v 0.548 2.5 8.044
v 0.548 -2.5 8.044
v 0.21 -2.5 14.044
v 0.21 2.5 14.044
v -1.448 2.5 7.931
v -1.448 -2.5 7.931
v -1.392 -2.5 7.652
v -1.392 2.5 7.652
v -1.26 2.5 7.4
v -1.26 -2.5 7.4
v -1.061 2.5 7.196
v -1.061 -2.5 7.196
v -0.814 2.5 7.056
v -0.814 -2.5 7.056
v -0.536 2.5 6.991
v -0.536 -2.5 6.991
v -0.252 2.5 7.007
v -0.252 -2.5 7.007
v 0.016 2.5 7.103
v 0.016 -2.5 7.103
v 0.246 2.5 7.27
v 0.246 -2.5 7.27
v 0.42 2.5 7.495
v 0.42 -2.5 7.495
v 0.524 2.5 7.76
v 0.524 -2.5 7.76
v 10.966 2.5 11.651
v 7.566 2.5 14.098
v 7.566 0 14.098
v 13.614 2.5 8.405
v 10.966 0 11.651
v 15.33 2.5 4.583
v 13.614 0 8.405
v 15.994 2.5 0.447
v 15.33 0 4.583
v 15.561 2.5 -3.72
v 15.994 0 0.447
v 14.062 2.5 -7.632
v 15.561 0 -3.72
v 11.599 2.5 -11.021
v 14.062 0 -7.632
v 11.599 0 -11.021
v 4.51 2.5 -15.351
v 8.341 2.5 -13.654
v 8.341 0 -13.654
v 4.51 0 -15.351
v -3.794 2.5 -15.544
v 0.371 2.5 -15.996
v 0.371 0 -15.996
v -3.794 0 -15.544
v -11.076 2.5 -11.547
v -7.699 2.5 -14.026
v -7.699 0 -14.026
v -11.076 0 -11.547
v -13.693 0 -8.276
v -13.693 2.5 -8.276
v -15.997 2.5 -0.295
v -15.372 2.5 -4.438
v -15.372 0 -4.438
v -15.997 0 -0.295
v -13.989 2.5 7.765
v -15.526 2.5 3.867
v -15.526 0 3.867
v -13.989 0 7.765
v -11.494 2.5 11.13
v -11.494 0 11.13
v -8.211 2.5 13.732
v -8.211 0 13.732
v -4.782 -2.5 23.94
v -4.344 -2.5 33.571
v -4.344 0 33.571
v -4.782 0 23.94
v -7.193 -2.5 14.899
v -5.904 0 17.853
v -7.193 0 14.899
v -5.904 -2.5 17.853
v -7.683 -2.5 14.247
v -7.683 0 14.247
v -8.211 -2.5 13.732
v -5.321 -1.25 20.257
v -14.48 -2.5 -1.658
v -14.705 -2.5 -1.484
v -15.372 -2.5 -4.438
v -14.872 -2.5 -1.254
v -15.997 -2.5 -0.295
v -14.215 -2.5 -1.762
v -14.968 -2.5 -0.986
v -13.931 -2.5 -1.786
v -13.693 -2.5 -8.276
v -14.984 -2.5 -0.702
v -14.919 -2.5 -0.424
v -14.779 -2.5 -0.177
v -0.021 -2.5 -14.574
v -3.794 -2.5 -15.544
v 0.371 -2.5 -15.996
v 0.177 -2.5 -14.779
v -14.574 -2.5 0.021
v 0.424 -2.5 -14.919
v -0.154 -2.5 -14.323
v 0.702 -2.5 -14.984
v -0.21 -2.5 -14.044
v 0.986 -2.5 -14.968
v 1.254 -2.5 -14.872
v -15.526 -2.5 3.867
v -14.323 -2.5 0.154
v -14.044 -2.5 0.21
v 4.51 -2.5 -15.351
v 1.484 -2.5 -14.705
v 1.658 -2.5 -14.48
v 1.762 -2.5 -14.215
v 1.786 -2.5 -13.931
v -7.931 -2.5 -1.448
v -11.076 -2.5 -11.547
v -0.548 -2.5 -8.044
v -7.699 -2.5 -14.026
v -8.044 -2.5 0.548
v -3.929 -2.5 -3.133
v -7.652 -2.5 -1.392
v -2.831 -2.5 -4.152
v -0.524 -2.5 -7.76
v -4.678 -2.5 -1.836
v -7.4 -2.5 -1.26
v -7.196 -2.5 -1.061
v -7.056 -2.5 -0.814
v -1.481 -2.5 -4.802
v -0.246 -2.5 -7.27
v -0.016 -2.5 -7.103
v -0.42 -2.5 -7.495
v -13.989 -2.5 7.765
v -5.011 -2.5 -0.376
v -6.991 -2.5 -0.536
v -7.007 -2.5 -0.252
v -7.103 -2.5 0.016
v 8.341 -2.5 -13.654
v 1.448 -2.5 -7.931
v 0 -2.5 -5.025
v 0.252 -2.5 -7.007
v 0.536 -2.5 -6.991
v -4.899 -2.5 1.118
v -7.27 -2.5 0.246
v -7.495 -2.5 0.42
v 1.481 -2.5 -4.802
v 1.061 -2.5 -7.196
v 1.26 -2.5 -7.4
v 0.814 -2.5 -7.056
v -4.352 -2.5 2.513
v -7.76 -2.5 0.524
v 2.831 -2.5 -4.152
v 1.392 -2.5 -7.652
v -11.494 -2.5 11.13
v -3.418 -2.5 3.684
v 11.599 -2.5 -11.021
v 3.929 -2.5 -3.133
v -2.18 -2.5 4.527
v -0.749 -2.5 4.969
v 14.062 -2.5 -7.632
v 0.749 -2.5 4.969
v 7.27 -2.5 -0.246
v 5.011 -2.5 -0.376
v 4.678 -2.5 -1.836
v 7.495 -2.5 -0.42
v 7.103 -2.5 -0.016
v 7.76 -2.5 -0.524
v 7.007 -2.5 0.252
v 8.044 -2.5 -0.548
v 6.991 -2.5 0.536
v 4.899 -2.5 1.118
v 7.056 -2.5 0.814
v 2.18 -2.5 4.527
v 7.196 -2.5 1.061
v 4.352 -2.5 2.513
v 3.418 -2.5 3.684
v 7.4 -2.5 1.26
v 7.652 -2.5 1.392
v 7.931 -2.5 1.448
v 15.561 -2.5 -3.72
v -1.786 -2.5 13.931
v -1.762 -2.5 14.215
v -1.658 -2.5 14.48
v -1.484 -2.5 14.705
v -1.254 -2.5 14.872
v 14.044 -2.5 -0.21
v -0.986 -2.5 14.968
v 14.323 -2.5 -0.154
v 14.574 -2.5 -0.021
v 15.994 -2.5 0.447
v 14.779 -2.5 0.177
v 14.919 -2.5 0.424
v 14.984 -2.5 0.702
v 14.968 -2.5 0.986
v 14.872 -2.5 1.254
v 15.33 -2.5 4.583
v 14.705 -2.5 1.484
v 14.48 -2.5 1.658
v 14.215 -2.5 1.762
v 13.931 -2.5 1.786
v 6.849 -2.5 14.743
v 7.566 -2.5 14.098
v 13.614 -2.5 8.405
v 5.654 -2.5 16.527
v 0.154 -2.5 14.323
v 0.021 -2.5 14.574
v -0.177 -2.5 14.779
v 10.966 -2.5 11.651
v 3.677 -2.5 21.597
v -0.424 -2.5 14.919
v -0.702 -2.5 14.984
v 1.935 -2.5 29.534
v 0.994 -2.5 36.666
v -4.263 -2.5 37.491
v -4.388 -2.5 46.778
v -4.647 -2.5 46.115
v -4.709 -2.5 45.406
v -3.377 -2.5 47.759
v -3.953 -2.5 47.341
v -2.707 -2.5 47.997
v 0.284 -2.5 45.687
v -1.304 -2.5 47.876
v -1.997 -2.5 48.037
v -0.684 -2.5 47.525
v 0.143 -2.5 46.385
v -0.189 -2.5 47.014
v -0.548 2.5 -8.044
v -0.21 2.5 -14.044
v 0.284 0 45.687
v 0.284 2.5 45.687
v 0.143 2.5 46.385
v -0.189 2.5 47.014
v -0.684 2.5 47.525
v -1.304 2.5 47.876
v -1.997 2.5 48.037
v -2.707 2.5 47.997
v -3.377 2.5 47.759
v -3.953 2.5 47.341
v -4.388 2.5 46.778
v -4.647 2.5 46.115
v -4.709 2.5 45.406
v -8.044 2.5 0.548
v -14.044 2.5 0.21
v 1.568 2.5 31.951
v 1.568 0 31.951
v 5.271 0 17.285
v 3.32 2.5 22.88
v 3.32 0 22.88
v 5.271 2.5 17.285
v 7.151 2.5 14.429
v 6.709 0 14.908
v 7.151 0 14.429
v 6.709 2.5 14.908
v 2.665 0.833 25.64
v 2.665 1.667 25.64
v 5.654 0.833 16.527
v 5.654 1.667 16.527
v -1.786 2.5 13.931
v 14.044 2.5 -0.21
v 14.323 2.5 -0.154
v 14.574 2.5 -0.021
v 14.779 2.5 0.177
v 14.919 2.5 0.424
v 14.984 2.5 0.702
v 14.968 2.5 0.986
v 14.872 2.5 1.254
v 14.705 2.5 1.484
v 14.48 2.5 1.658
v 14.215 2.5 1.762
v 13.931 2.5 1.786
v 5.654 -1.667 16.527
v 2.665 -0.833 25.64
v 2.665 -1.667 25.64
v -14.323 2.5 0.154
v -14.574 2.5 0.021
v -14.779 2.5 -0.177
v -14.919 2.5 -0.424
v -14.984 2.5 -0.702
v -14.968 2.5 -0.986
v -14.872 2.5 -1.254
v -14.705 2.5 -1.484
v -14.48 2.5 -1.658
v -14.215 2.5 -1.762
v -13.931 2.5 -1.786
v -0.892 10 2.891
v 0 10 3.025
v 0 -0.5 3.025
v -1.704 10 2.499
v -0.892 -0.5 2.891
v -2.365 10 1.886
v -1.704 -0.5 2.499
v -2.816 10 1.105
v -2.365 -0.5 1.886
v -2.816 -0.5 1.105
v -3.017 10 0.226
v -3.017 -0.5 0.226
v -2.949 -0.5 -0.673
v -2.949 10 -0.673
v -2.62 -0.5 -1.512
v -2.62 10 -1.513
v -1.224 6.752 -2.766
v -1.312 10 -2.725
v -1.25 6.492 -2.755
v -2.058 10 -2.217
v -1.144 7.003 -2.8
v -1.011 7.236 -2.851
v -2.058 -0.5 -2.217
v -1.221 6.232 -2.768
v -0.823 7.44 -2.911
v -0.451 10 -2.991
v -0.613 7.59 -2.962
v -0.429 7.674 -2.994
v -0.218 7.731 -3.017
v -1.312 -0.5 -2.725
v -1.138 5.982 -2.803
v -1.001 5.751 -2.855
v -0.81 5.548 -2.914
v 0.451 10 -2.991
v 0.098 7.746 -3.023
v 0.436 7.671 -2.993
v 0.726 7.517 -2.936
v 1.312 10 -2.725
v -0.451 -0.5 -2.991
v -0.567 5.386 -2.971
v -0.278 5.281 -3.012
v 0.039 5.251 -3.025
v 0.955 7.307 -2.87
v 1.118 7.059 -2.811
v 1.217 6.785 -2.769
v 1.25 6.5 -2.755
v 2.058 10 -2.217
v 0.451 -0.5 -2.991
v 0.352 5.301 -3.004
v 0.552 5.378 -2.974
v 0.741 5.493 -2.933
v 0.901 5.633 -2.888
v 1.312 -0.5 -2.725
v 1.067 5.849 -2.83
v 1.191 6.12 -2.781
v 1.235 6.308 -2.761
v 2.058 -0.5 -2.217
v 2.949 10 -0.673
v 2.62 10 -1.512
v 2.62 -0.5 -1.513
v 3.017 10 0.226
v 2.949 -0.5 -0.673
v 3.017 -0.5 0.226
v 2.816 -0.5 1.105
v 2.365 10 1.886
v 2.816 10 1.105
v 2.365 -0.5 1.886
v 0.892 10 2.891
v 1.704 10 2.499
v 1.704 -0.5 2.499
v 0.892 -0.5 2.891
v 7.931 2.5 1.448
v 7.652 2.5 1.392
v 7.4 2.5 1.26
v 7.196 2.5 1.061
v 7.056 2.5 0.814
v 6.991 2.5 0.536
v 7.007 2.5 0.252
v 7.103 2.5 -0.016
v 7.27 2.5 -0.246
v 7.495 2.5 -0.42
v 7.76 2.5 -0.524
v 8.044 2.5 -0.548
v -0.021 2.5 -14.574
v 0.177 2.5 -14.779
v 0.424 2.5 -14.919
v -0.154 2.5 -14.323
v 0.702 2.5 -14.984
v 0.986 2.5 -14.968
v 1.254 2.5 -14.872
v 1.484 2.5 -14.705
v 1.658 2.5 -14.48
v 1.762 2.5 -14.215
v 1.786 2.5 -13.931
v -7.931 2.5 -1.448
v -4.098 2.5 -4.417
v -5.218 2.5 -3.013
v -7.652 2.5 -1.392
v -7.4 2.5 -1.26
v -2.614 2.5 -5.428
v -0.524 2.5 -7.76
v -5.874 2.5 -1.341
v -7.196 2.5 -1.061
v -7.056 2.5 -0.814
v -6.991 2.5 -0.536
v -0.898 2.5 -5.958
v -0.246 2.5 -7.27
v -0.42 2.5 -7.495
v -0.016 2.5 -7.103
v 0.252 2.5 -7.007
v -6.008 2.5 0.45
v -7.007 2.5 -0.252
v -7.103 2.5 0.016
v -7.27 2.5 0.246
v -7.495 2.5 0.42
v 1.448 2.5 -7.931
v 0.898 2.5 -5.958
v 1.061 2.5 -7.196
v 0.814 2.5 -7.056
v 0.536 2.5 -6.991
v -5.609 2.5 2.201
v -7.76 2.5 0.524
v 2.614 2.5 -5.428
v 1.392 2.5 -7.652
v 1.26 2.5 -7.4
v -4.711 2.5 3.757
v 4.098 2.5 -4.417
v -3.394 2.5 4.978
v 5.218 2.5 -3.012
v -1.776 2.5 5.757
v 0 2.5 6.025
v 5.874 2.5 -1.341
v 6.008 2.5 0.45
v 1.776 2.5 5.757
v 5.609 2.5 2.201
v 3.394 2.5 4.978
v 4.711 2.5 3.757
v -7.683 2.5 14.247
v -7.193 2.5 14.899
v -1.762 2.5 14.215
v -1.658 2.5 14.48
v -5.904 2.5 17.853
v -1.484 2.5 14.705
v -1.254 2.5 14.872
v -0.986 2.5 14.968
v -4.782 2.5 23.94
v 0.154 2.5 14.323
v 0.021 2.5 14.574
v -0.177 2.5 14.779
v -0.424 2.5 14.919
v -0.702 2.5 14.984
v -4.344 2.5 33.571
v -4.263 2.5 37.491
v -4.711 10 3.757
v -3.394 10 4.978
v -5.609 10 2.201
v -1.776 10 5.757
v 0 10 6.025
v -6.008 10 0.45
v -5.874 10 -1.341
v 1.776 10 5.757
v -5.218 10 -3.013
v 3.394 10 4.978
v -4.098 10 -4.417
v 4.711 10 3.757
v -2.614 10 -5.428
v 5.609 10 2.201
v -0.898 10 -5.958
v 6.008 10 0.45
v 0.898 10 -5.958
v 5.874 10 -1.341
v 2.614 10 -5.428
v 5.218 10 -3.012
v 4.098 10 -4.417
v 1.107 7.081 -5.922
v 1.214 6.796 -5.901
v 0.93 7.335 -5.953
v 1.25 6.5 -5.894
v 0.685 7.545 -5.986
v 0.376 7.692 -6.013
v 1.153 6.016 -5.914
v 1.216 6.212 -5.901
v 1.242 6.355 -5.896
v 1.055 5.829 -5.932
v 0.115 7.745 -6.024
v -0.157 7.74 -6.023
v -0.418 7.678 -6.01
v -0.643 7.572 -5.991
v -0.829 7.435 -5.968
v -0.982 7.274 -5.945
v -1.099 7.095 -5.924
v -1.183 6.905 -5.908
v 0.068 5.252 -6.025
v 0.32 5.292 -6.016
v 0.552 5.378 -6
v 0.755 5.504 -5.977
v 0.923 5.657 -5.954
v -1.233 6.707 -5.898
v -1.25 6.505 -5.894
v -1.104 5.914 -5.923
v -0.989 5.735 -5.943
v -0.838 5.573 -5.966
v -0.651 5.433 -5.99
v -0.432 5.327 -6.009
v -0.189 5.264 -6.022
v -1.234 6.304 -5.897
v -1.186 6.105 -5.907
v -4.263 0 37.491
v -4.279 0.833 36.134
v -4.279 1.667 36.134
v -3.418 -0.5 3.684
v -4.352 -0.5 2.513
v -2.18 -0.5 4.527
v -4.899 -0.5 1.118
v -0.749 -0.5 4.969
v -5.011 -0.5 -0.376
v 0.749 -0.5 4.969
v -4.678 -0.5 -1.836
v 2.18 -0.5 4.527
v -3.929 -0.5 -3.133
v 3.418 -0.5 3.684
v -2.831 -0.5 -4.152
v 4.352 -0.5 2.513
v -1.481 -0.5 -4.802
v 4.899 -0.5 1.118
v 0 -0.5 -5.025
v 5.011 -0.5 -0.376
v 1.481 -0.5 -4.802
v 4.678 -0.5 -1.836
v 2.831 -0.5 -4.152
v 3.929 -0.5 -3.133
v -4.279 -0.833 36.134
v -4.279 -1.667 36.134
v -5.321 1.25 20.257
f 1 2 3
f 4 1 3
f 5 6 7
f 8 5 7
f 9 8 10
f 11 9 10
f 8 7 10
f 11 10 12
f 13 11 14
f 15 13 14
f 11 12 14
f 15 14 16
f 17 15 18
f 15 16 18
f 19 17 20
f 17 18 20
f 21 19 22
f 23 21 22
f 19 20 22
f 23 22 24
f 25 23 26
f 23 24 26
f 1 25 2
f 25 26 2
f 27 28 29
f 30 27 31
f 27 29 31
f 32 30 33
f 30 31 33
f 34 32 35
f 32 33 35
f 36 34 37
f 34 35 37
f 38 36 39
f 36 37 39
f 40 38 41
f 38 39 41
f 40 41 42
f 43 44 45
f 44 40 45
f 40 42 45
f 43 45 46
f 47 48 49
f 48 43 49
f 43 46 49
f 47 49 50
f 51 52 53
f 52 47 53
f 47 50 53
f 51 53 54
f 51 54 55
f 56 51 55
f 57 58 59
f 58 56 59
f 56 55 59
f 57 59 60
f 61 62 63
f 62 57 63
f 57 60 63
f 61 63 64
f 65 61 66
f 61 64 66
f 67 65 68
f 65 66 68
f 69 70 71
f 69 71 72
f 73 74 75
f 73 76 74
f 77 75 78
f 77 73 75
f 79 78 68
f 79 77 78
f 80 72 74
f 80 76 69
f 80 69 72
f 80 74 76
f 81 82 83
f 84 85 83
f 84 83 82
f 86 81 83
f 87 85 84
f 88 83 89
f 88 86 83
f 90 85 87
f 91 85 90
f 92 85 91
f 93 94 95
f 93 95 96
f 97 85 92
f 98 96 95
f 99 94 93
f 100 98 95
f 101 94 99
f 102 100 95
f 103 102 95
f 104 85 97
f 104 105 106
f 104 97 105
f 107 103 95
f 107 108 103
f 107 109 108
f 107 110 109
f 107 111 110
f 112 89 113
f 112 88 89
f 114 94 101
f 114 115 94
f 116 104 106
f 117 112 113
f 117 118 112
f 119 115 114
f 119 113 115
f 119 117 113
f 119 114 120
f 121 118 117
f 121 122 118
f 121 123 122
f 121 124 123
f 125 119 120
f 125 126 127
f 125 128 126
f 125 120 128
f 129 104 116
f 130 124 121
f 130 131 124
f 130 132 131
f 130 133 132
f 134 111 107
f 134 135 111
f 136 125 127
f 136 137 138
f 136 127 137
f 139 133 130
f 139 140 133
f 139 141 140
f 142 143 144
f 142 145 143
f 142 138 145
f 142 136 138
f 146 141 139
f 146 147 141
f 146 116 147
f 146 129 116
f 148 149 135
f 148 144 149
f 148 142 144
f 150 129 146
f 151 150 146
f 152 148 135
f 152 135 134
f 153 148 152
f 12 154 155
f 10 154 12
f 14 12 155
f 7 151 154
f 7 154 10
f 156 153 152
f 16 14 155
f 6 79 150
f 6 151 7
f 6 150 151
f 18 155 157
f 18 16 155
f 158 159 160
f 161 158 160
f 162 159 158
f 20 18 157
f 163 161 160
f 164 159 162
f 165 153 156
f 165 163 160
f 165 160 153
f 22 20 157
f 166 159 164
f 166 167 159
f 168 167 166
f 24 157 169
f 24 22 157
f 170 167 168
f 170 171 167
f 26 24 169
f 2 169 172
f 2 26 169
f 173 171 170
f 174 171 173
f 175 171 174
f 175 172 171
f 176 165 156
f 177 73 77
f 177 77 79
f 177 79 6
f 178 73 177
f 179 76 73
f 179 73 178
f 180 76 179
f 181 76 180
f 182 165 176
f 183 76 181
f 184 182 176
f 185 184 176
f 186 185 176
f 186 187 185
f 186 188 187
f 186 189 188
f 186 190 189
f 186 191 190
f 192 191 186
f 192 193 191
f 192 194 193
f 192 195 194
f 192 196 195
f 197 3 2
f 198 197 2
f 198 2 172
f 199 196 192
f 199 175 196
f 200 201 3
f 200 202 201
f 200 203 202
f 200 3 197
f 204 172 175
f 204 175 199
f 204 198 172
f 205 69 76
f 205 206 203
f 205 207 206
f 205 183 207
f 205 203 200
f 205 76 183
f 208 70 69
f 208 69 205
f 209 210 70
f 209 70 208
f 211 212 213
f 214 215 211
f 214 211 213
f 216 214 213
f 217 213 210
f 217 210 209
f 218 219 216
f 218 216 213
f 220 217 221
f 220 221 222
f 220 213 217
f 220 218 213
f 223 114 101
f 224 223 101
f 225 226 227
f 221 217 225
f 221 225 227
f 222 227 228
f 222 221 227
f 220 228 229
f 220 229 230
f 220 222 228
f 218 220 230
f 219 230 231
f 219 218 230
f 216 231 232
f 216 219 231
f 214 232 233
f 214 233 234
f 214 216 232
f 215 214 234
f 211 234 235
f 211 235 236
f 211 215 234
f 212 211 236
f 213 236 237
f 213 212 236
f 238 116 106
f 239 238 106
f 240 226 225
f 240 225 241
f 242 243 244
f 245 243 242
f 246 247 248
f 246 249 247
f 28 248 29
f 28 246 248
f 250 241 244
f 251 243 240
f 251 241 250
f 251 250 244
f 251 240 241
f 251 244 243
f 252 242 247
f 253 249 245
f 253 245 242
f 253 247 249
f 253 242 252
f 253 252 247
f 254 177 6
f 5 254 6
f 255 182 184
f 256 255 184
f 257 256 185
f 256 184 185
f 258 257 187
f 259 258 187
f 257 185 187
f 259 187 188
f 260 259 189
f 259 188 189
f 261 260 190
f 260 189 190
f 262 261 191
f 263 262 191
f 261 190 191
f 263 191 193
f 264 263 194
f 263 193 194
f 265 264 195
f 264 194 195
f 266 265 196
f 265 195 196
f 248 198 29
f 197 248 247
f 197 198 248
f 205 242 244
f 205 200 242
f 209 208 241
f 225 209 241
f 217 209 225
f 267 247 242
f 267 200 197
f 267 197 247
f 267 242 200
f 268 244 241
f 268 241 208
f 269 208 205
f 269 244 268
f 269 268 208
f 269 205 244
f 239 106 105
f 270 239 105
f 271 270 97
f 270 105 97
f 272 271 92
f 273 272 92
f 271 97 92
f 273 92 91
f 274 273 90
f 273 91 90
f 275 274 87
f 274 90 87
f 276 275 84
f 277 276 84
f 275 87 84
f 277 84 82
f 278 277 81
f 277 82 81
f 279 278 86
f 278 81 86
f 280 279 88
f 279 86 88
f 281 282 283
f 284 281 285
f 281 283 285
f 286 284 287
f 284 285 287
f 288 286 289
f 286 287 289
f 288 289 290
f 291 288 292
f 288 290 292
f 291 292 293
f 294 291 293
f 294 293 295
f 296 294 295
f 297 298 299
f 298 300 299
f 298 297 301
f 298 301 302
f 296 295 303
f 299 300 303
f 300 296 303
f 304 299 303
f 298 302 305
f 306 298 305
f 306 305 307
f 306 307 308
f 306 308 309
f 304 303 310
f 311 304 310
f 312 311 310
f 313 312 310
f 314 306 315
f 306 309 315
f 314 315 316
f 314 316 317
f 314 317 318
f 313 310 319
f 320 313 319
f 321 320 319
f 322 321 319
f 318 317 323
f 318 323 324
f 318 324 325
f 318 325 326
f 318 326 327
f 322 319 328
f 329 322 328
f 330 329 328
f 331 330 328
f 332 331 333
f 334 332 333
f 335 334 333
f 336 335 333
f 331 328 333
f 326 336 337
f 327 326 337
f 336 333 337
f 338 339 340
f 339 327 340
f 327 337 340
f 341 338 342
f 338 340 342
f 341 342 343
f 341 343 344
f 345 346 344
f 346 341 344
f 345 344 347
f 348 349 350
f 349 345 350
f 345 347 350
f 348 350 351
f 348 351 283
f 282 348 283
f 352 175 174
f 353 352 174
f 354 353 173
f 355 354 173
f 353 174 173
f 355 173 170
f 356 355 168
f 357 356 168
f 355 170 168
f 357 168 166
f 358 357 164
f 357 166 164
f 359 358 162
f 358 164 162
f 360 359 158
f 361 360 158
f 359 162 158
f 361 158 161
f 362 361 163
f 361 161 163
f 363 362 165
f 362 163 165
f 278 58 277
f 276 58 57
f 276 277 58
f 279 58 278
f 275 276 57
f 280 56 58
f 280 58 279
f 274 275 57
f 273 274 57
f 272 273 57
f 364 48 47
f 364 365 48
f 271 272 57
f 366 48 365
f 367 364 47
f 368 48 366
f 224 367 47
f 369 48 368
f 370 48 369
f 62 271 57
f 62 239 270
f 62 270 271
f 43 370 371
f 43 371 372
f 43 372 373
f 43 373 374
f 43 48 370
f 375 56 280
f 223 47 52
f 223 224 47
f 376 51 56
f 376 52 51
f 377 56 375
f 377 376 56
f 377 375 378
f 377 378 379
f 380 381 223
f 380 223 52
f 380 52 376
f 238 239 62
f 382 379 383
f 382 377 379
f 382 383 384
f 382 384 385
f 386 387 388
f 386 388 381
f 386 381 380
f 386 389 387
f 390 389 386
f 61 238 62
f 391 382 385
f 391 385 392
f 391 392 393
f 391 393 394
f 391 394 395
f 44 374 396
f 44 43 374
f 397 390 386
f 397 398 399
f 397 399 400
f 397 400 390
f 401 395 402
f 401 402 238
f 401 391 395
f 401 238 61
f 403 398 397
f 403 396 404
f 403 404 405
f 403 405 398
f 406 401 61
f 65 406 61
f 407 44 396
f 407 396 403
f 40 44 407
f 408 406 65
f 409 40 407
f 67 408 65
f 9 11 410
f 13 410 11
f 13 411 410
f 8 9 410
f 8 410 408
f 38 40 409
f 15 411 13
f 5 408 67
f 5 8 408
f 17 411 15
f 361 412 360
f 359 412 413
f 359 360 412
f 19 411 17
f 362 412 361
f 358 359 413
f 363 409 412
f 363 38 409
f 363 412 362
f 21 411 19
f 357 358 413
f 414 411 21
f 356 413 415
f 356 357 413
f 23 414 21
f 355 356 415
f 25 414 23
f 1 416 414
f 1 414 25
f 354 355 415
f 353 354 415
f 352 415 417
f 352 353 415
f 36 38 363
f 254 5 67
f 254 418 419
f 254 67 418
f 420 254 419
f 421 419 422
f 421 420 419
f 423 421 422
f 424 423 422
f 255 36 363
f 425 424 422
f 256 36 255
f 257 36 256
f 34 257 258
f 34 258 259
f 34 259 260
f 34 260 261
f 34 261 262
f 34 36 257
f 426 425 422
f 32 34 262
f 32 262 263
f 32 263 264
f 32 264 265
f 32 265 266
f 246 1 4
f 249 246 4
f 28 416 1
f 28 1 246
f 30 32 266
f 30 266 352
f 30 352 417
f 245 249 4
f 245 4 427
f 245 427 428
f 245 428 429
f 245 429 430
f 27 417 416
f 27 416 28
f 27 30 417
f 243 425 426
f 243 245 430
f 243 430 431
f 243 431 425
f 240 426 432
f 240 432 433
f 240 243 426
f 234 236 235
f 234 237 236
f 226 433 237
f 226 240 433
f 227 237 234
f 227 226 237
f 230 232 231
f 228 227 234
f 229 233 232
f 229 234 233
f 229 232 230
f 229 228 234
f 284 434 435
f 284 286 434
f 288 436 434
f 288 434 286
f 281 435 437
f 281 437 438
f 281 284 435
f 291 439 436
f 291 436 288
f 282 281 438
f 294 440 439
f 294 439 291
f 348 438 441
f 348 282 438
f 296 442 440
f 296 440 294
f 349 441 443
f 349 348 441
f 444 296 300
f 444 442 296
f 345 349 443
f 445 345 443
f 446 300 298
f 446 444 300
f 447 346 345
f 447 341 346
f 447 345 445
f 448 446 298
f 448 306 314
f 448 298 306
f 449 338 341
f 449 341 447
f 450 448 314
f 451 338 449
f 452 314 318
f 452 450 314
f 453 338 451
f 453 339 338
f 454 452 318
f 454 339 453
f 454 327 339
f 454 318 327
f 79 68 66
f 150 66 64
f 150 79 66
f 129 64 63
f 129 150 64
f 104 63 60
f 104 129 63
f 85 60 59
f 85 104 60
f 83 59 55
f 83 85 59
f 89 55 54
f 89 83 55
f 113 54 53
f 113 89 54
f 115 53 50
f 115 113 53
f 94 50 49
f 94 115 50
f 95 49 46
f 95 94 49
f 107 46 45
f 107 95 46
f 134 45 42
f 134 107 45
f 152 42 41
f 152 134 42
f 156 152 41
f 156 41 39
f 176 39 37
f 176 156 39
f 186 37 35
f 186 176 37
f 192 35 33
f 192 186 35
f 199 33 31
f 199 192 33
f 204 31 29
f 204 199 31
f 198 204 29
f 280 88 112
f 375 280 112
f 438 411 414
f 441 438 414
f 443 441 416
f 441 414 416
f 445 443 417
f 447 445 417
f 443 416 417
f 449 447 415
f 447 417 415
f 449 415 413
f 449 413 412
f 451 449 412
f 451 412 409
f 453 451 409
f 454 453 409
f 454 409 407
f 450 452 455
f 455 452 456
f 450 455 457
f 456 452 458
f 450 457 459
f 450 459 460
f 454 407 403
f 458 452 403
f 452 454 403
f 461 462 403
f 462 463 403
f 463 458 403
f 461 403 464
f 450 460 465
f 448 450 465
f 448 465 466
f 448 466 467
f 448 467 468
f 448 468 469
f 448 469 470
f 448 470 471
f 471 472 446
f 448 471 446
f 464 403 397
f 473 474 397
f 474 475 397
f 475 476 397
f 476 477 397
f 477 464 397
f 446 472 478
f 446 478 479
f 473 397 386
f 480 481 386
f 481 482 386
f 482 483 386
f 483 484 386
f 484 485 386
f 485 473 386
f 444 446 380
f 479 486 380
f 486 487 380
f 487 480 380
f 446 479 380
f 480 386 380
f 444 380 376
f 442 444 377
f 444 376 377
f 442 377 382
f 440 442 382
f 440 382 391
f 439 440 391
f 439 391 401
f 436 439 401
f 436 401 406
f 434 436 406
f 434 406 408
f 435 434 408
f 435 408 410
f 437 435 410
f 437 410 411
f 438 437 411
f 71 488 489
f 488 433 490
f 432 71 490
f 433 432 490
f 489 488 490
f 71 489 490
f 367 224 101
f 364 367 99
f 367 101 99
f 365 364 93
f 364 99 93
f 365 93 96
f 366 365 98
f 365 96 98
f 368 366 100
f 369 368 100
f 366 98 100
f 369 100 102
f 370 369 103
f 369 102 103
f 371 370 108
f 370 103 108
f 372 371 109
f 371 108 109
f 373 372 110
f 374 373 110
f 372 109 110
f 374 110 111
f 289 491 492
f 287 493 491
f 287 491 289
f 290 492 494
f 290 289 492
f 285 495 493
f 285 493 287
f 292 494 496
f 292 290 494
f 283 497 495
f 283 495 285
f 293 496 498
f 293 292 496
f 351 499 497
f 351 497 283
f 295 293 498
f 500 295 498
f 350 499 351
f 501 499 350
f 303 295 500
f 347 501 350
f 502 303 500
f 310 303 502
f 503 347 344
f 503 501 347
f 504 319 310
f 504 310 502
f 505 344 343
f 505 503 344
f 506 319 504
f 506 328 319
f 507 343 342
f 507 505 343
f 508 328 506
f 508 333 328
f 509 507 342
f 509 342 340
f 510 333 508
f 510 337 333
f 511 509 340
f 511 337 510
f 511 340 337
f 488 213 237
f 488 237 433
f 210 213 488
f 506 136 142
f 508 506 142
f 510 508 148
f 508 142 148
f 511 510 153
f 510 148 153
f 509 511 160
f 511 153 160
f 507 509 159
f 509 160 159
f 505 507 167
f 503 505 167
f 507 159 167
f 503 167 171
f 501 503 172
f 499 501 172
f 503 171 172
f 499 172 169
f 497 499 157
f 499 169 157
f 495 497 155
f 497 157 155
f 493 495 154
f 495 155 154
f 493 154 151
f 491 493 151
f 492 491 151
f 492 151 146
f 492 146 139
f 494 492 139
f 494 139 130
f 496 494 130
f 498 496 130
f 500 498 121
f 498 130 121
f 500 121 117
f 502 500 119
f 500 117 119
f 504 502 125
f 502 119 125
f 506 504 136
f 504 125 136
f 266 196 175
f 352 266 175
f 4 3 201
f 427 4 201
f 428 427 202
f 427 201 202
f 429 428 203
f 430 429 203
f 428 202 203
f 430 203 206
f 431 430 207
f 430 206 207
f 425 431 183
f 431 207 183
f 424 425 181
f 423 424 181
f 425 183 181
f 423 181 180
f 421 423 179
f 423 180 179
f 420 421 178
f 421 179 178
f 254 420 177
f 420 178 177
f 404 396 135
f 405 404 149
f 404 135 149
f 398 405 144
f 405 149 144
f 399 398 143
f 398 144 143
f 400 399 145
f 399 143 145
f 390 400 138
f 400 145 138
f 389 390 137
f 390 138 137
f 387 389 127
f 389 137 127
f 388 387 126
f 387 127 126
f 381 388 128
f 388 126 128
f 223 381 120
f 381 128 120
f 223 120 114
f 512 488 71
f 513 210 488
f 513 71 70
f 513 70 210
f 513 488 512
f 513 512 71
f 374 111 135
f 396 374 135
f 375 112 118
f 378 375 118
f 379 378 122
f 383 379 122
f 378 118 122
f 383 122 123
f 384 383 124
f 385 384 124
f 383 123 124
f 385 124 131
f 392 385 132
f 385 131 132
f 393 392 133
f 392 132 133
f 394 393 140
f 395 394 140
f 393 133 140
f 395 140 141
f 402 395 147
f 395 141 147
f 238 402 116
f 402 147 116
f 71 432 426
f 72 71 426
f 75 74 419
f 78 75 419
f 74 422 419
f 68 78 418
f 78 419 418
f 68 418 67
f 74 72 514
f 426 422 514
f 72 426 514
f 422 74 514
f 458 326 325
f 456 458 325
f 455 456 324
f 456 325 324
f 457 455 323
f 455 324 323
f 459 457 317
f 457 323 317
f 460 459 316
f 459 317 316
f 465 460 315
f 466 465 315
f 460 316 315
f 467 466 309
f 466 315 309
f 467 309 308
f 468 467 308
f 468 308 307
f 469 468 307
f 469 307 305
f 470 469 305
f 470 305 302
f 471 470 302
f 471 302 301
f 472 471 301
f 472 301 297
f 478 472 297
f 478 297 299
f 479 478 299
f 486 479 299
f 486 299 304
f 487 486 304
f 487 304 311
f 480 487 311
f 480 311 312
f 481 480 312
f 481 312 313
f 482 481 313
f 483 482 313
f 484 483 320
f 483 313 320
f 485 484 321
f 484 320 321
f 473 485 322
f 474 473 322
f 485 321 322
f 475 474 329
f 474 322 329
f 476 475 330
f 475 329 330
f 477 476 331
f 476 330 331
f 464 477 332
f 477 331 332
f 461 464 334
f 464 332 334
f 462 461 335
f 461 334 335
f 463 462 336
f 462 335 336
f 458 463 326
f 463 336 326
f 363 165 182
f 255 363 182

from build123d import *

# Parameters (mm, degrees)
BOSS_EXTRUDE1_OUTLINE_R = 16
BOSS_EXTRUDE1_DEPTH     = 10
SKETCH2_R               = 3.025
CUT_EXTRUDE1_DEPTH      = 25.738633754
CUT_EXTRUDE2_START      = -7.5
SKETCH3_R               = 16
SKETCH3_R_2             = 6.025
CUT_EXTRUDE2_DEPTH      = 7.5
SKETCH4_R               = 1.25
CUT_EXTRUDE3_DEPTH      = 10
CUT_EXTRUDE4_DEPTH      = 10
BOSS_EXTRUDE2_START     = -2.5
BOSS_EXTRUDE2_DEPTH     = 2.5
BOSS_EXTRUDE3_START     = 2.5
SKETCH9_R               = 3.025
BOSS_EXTRUDE3_DEPTH     = 2.5
SKETCH10_R              = 5.025
CUT_EXTRUDE5_DEPTH      = 2


# Read off the part's stored shape, not the designer's step: Boss-Extrude1, Boss-Extrude2
with BuildPart() as part:
    # Boss-Extrude1 outline → Boss-Extrude1 (new body)
    with BuildSketch(Plane(origin=(0, 0, 0), x_dir=(1, 0, 0), z_dir=(0, 1, 0))):
        Circle(BOSS_EXTRUDE1_OUTLINE_R)
    extrude(amount=BOSS_EXTRUDE1_DEPTH)

    # Sketch2 → Cut-Extrude1 (cut, through all)
    with BuildSketch(Plane(origin=(0, 10, 0), x_dir=(1, 0, 0), z_dir=(0, 1, 0))):
        with Locations(Location((0, 0, 0), (0, 0, 270))):
            Circle(SKETCH2_R)
    extrude(amount=-CUT_EXTRUDE1_DEPTH, mode=Mode.SUBTRACT)

    # Sketch3 → Cut-Extrude2 (cut)
    with BuildSketch(Plane(origin=(0, 10, 0), x_dir=(1, 0, 0), z_dir=(0, 1, 0)).offset(CUT_EXTRUDE2_START)):
        with Locations(Location((0, 0, 0), (0, 0, 270))):
            Circle(SKETCH3_R)
        with Locations(Location((0, 0, 0), (0, 0, 270))):
            Circle(SKETCH3_R_2, mode=Mode.SUBTRACT)
    extrude(amount=CUT_EXTRUDE2_DEPTH, mode=Mode.SUBTRACT)

    # Sketch4 → Cut-Extrude3 (cut)
    with BuildSketch(Plane.XY):
        with Locations((0, 6.5)):
            Circle(SKETCH4_R)
    extrude(amount=-CUT_EXTRUDE3_DEPTH, mode=Mode.SUBTRACT)

    # Sketch5 → Cut-Extrude4 (cut)
    with BuildSketch(Plane(origin=(0, 0, 0), x_dir=(-1, 0, 0), z_dir=(0, -1, 0))):
        with BuildLine():
            Line((0.210340042, 14.04358534), (0.548392997, 8.04358534))
            ThreePointArc((0.548392997, 8.04358534), (-0.393770609, 6.988915846), (-1.448440102, 7.931079452))
            Line((-1.448440102, 7.931079452), (-1.786493057, 13.931079452))
            ThreePointArc((-1.786493057, 13.931079452), (-0.844329452, 14.985748945), (0.210340042, 14.04358534))
        make_face()
        with BuildLine():
            Line((13.931079452, 1.786493057), (7.931079452, 1.448440102))
            ThreePointArc((7.931079452, 1.448440102), (6.988915846, 0.393770609), (8.04358534, -0.548392997))
            Line((8.04358534, -0.548392997), (14.04358534, -0.210340042))
            ThreePointArc((14.04358534, -0.210340042), (14.985748945, 0.844329452), (13.931079452, 1.786493057))
        make_face()
        with BuildLine():
            Line((1.786493057, -13.931079452), (1.448440102, -7.931079452))
            ThreePointArc((1.448440102, -7.931079452), (0.393770609, -6.988915846), (-0.548392997, -8.04358534))
            Line((-0.548392997, -8.04358534), (-0.210340042, -14.04358534))
            ThreePointArc((-0.210340042, -14.04358534), (0.844329452, -14.985748945), (1.786493057, -13.931079452))
        make_face()
        with BuildLine():
            Line((-13.931079452, -1.786493057), (-7.931079452, -1.448440102))
            ThreePointArc((-7.931079452, -1.448440102), (-6.988915846, -0.393770609), (-8.04358534, 0.548392997))
            Line((-8.04358534, 0.548392997), (-14.04358534, 0.210340042))
            ThreePointArc((-14.04358534, 0.210340042), (-14.985748945, -0.844329452), (-13.931079452, -1.786493057))
        make_face()
    extrude(amount=-CUT_EXTRUDE4_DEPTH, mode=Mode.SUBTRACT)

    # Boss-Extrude2 outline → Boss-Extrude2 (add)
    with BuildSketch(Plane.XZ.offset(BOSS_EXTRUDE2_START)):
        with BuildLine():
            Line((-4.70856839, 45.405985014), (-4.262641267, 37.491359232))
            add(Edge.make_bspline(
                [(-4.262641267, 37.491359232), (-4.273296685, 36.107939283), (-4.30106716, 34.802769075), (-4.343751974, 33.571480974)],
                knots=[0.099174475, 0.099174475, 0.099174475, 0.099174475, 0.155965257, 0.155965257, 0.155965257, 0.155965257], degree=3))
            add(Edge.make_bspline(
                [(-4.343751974, 33.571480974), (-4.363830382, 16.861397245), (-8.211036006, 13.732402838)],
                knots=[0.224223151, 0.224223151, 0.224223151, 0.938226666, 0.938226666, 0.938226666], degree=2))
            ThreePointArc((-8.211036006, 13.732402838), (-0.370996908, 15.995698212), (7.565543006, 14.098317596))
            add(Edge.make_bspline(
                [(0.283514356, 45.687249745), (1.800888573, 18.755833196), (6.7530796, 14.602380887), (7.565543006, 14.098317596)],
                knots=[0, 0, 0, 0, 0.916762244, 0.916762244, 0.916762244, 0.916762244], degree=3))
            ThreePointArc((0.283514356, 45.687249745), (-2.353159383, 48.042658753), (-4.70856839, 45.405985014))
        make_face()
    extrude(amount=BOSS_EXTRUDE2_DEPTH)

    # Sketch9 → Boss-Extrude3 (add)
    with BuildSketch(Plane.XZ.offset(BOSS_EXTRUDE3_START)):
        with BuildLine():
            Line((-4.70856839, 45.405985014), (-4.262641267, 37.491359232))
            add(Edge.make_bspline(
                [(-4.262641267, 37.491359232), (-4.273296685, 36.107939283), (-4.30106716, 34.802769075), (-4.343751974, 33.571480974)],
                knots=[0.099174475, 0.099174475, 0.099174475, 0.099174475, 0.155965257, 0.155965257, 0.155965257, 0.155965257], degree=3))
            add(Edge.make_bspline(
                [(-4.343751974, 33.571480974), (-4.363830382, 16.861397245), (-8.211036006, 13.732402838)],
                knots=[0, 0, 0, 1, 1, 1], degree=2))
            ThreePointArc((-8.211036006, 13.732402838), (0.370996908, -15.995698212), (7.565543006, 14.098317596))
            add(Edge.make_bspline(
                [(7.565543006, 14.098317596), (6.7530796, 14.602380887), (1.800888573, 18.755833196), (0.283514356, 45.687249745)],
                knots=[0, 0, 0, 0, 0.916762244, 0.916762244, 0.916762244, 0.916762244], degree=3))
            ThreePointArc((0.283514356, 45.687249745), (-2.353159383, 48.042658753), (-4.70856839, 45.405985014))
        make_face()
        with Locations(Location((0, 0, 0), (0, 0, 90))):
            Circle(SKETCH9_R, mode=Mode.SUBTRACT)
        with BuildLine():
            Line((-1.786493057, 13.931079452), (-1.448440102, 7.931079452))
            ThreePointArc((-1.448440102, 7.931079452), (-0.393770609, 6.988915846), (0.548392997, 8.04358534))
            Line((0.548392997, 8.04358534), (0.210340042, 14.04358534))
            ThreePointArc((0.210340042, 14.04358534), (-0.844329452, 14.985748945), (-1.786493057, 13.931079452))
        make_face(mode=Mode.SUBTRACT)
        with BuildLine():
            Line((-13.931079452, -1.786493057), (-7.931079452, -1.448440102))
            ThreePointArc((-7.931079452, -1.448440102), (-6.988915846, -0.393770609), (-8.04358534, 0.548392997))
            Line((-8.04358534, 0.548392997), (-14.04358534, 0.210340042))
            ThreePointArc((-14.04358534, 0.210340042), (-14.985748945, -0.844329452), (-13.931079452, -1.786493057))
        make_face(mode=Mode.SUBTRACT)
        with BuildLine():
            Line((1.786493057, -13.931079452), (1.448440102, -7.931079452))
            ThreePointArc((1.448440102, -7.931079452), (0.393770609, -6.988915846), (-0.548392997, -8.04358534))
            Line((-0.548392997, -8.04358534), (-0.210340042, -14.04358534))
            ThreePointArc((-0.210340042, -14.04358534), (0.844329452, -14.985748945), (1.786493057, -13.931079452))
        make_face(mode=Mode.SUBTRACT)
        with BuildLine():
            Line((13.931079452, 1.786493057), (7.931079452, 1.448440102))
            ThreePointArc((7.931079452, 1.448440102), (6.988915846, 0.393770609), (8.04358534, -0.548392997))
            Line((8.04358534, -0.548392997), (14.04358534, -0.210340042))
            ThreePointArc((14.04358534, -0.210340042), (14.985748945, 0.844329452), (13.931079452, 1.786493057))
        make_face(mode=Mode.SUBTRACT)
    extrude(amount=-BOSS_EXTRUDE3_DEPTH)

    # Sketch10 → Cut-Extrude5 (cut)
    with BuildSketch(Plane.XZ.offset(2.5)):
        with Locations(Location((0, 0, 0), (0, 0, 270))):
            Circle(SKETCH10_R)
    extrude(amount=-CUT_EXTRUDE5_DEPTH, mode=Mode.SUBTRACT)


solid = part.part
